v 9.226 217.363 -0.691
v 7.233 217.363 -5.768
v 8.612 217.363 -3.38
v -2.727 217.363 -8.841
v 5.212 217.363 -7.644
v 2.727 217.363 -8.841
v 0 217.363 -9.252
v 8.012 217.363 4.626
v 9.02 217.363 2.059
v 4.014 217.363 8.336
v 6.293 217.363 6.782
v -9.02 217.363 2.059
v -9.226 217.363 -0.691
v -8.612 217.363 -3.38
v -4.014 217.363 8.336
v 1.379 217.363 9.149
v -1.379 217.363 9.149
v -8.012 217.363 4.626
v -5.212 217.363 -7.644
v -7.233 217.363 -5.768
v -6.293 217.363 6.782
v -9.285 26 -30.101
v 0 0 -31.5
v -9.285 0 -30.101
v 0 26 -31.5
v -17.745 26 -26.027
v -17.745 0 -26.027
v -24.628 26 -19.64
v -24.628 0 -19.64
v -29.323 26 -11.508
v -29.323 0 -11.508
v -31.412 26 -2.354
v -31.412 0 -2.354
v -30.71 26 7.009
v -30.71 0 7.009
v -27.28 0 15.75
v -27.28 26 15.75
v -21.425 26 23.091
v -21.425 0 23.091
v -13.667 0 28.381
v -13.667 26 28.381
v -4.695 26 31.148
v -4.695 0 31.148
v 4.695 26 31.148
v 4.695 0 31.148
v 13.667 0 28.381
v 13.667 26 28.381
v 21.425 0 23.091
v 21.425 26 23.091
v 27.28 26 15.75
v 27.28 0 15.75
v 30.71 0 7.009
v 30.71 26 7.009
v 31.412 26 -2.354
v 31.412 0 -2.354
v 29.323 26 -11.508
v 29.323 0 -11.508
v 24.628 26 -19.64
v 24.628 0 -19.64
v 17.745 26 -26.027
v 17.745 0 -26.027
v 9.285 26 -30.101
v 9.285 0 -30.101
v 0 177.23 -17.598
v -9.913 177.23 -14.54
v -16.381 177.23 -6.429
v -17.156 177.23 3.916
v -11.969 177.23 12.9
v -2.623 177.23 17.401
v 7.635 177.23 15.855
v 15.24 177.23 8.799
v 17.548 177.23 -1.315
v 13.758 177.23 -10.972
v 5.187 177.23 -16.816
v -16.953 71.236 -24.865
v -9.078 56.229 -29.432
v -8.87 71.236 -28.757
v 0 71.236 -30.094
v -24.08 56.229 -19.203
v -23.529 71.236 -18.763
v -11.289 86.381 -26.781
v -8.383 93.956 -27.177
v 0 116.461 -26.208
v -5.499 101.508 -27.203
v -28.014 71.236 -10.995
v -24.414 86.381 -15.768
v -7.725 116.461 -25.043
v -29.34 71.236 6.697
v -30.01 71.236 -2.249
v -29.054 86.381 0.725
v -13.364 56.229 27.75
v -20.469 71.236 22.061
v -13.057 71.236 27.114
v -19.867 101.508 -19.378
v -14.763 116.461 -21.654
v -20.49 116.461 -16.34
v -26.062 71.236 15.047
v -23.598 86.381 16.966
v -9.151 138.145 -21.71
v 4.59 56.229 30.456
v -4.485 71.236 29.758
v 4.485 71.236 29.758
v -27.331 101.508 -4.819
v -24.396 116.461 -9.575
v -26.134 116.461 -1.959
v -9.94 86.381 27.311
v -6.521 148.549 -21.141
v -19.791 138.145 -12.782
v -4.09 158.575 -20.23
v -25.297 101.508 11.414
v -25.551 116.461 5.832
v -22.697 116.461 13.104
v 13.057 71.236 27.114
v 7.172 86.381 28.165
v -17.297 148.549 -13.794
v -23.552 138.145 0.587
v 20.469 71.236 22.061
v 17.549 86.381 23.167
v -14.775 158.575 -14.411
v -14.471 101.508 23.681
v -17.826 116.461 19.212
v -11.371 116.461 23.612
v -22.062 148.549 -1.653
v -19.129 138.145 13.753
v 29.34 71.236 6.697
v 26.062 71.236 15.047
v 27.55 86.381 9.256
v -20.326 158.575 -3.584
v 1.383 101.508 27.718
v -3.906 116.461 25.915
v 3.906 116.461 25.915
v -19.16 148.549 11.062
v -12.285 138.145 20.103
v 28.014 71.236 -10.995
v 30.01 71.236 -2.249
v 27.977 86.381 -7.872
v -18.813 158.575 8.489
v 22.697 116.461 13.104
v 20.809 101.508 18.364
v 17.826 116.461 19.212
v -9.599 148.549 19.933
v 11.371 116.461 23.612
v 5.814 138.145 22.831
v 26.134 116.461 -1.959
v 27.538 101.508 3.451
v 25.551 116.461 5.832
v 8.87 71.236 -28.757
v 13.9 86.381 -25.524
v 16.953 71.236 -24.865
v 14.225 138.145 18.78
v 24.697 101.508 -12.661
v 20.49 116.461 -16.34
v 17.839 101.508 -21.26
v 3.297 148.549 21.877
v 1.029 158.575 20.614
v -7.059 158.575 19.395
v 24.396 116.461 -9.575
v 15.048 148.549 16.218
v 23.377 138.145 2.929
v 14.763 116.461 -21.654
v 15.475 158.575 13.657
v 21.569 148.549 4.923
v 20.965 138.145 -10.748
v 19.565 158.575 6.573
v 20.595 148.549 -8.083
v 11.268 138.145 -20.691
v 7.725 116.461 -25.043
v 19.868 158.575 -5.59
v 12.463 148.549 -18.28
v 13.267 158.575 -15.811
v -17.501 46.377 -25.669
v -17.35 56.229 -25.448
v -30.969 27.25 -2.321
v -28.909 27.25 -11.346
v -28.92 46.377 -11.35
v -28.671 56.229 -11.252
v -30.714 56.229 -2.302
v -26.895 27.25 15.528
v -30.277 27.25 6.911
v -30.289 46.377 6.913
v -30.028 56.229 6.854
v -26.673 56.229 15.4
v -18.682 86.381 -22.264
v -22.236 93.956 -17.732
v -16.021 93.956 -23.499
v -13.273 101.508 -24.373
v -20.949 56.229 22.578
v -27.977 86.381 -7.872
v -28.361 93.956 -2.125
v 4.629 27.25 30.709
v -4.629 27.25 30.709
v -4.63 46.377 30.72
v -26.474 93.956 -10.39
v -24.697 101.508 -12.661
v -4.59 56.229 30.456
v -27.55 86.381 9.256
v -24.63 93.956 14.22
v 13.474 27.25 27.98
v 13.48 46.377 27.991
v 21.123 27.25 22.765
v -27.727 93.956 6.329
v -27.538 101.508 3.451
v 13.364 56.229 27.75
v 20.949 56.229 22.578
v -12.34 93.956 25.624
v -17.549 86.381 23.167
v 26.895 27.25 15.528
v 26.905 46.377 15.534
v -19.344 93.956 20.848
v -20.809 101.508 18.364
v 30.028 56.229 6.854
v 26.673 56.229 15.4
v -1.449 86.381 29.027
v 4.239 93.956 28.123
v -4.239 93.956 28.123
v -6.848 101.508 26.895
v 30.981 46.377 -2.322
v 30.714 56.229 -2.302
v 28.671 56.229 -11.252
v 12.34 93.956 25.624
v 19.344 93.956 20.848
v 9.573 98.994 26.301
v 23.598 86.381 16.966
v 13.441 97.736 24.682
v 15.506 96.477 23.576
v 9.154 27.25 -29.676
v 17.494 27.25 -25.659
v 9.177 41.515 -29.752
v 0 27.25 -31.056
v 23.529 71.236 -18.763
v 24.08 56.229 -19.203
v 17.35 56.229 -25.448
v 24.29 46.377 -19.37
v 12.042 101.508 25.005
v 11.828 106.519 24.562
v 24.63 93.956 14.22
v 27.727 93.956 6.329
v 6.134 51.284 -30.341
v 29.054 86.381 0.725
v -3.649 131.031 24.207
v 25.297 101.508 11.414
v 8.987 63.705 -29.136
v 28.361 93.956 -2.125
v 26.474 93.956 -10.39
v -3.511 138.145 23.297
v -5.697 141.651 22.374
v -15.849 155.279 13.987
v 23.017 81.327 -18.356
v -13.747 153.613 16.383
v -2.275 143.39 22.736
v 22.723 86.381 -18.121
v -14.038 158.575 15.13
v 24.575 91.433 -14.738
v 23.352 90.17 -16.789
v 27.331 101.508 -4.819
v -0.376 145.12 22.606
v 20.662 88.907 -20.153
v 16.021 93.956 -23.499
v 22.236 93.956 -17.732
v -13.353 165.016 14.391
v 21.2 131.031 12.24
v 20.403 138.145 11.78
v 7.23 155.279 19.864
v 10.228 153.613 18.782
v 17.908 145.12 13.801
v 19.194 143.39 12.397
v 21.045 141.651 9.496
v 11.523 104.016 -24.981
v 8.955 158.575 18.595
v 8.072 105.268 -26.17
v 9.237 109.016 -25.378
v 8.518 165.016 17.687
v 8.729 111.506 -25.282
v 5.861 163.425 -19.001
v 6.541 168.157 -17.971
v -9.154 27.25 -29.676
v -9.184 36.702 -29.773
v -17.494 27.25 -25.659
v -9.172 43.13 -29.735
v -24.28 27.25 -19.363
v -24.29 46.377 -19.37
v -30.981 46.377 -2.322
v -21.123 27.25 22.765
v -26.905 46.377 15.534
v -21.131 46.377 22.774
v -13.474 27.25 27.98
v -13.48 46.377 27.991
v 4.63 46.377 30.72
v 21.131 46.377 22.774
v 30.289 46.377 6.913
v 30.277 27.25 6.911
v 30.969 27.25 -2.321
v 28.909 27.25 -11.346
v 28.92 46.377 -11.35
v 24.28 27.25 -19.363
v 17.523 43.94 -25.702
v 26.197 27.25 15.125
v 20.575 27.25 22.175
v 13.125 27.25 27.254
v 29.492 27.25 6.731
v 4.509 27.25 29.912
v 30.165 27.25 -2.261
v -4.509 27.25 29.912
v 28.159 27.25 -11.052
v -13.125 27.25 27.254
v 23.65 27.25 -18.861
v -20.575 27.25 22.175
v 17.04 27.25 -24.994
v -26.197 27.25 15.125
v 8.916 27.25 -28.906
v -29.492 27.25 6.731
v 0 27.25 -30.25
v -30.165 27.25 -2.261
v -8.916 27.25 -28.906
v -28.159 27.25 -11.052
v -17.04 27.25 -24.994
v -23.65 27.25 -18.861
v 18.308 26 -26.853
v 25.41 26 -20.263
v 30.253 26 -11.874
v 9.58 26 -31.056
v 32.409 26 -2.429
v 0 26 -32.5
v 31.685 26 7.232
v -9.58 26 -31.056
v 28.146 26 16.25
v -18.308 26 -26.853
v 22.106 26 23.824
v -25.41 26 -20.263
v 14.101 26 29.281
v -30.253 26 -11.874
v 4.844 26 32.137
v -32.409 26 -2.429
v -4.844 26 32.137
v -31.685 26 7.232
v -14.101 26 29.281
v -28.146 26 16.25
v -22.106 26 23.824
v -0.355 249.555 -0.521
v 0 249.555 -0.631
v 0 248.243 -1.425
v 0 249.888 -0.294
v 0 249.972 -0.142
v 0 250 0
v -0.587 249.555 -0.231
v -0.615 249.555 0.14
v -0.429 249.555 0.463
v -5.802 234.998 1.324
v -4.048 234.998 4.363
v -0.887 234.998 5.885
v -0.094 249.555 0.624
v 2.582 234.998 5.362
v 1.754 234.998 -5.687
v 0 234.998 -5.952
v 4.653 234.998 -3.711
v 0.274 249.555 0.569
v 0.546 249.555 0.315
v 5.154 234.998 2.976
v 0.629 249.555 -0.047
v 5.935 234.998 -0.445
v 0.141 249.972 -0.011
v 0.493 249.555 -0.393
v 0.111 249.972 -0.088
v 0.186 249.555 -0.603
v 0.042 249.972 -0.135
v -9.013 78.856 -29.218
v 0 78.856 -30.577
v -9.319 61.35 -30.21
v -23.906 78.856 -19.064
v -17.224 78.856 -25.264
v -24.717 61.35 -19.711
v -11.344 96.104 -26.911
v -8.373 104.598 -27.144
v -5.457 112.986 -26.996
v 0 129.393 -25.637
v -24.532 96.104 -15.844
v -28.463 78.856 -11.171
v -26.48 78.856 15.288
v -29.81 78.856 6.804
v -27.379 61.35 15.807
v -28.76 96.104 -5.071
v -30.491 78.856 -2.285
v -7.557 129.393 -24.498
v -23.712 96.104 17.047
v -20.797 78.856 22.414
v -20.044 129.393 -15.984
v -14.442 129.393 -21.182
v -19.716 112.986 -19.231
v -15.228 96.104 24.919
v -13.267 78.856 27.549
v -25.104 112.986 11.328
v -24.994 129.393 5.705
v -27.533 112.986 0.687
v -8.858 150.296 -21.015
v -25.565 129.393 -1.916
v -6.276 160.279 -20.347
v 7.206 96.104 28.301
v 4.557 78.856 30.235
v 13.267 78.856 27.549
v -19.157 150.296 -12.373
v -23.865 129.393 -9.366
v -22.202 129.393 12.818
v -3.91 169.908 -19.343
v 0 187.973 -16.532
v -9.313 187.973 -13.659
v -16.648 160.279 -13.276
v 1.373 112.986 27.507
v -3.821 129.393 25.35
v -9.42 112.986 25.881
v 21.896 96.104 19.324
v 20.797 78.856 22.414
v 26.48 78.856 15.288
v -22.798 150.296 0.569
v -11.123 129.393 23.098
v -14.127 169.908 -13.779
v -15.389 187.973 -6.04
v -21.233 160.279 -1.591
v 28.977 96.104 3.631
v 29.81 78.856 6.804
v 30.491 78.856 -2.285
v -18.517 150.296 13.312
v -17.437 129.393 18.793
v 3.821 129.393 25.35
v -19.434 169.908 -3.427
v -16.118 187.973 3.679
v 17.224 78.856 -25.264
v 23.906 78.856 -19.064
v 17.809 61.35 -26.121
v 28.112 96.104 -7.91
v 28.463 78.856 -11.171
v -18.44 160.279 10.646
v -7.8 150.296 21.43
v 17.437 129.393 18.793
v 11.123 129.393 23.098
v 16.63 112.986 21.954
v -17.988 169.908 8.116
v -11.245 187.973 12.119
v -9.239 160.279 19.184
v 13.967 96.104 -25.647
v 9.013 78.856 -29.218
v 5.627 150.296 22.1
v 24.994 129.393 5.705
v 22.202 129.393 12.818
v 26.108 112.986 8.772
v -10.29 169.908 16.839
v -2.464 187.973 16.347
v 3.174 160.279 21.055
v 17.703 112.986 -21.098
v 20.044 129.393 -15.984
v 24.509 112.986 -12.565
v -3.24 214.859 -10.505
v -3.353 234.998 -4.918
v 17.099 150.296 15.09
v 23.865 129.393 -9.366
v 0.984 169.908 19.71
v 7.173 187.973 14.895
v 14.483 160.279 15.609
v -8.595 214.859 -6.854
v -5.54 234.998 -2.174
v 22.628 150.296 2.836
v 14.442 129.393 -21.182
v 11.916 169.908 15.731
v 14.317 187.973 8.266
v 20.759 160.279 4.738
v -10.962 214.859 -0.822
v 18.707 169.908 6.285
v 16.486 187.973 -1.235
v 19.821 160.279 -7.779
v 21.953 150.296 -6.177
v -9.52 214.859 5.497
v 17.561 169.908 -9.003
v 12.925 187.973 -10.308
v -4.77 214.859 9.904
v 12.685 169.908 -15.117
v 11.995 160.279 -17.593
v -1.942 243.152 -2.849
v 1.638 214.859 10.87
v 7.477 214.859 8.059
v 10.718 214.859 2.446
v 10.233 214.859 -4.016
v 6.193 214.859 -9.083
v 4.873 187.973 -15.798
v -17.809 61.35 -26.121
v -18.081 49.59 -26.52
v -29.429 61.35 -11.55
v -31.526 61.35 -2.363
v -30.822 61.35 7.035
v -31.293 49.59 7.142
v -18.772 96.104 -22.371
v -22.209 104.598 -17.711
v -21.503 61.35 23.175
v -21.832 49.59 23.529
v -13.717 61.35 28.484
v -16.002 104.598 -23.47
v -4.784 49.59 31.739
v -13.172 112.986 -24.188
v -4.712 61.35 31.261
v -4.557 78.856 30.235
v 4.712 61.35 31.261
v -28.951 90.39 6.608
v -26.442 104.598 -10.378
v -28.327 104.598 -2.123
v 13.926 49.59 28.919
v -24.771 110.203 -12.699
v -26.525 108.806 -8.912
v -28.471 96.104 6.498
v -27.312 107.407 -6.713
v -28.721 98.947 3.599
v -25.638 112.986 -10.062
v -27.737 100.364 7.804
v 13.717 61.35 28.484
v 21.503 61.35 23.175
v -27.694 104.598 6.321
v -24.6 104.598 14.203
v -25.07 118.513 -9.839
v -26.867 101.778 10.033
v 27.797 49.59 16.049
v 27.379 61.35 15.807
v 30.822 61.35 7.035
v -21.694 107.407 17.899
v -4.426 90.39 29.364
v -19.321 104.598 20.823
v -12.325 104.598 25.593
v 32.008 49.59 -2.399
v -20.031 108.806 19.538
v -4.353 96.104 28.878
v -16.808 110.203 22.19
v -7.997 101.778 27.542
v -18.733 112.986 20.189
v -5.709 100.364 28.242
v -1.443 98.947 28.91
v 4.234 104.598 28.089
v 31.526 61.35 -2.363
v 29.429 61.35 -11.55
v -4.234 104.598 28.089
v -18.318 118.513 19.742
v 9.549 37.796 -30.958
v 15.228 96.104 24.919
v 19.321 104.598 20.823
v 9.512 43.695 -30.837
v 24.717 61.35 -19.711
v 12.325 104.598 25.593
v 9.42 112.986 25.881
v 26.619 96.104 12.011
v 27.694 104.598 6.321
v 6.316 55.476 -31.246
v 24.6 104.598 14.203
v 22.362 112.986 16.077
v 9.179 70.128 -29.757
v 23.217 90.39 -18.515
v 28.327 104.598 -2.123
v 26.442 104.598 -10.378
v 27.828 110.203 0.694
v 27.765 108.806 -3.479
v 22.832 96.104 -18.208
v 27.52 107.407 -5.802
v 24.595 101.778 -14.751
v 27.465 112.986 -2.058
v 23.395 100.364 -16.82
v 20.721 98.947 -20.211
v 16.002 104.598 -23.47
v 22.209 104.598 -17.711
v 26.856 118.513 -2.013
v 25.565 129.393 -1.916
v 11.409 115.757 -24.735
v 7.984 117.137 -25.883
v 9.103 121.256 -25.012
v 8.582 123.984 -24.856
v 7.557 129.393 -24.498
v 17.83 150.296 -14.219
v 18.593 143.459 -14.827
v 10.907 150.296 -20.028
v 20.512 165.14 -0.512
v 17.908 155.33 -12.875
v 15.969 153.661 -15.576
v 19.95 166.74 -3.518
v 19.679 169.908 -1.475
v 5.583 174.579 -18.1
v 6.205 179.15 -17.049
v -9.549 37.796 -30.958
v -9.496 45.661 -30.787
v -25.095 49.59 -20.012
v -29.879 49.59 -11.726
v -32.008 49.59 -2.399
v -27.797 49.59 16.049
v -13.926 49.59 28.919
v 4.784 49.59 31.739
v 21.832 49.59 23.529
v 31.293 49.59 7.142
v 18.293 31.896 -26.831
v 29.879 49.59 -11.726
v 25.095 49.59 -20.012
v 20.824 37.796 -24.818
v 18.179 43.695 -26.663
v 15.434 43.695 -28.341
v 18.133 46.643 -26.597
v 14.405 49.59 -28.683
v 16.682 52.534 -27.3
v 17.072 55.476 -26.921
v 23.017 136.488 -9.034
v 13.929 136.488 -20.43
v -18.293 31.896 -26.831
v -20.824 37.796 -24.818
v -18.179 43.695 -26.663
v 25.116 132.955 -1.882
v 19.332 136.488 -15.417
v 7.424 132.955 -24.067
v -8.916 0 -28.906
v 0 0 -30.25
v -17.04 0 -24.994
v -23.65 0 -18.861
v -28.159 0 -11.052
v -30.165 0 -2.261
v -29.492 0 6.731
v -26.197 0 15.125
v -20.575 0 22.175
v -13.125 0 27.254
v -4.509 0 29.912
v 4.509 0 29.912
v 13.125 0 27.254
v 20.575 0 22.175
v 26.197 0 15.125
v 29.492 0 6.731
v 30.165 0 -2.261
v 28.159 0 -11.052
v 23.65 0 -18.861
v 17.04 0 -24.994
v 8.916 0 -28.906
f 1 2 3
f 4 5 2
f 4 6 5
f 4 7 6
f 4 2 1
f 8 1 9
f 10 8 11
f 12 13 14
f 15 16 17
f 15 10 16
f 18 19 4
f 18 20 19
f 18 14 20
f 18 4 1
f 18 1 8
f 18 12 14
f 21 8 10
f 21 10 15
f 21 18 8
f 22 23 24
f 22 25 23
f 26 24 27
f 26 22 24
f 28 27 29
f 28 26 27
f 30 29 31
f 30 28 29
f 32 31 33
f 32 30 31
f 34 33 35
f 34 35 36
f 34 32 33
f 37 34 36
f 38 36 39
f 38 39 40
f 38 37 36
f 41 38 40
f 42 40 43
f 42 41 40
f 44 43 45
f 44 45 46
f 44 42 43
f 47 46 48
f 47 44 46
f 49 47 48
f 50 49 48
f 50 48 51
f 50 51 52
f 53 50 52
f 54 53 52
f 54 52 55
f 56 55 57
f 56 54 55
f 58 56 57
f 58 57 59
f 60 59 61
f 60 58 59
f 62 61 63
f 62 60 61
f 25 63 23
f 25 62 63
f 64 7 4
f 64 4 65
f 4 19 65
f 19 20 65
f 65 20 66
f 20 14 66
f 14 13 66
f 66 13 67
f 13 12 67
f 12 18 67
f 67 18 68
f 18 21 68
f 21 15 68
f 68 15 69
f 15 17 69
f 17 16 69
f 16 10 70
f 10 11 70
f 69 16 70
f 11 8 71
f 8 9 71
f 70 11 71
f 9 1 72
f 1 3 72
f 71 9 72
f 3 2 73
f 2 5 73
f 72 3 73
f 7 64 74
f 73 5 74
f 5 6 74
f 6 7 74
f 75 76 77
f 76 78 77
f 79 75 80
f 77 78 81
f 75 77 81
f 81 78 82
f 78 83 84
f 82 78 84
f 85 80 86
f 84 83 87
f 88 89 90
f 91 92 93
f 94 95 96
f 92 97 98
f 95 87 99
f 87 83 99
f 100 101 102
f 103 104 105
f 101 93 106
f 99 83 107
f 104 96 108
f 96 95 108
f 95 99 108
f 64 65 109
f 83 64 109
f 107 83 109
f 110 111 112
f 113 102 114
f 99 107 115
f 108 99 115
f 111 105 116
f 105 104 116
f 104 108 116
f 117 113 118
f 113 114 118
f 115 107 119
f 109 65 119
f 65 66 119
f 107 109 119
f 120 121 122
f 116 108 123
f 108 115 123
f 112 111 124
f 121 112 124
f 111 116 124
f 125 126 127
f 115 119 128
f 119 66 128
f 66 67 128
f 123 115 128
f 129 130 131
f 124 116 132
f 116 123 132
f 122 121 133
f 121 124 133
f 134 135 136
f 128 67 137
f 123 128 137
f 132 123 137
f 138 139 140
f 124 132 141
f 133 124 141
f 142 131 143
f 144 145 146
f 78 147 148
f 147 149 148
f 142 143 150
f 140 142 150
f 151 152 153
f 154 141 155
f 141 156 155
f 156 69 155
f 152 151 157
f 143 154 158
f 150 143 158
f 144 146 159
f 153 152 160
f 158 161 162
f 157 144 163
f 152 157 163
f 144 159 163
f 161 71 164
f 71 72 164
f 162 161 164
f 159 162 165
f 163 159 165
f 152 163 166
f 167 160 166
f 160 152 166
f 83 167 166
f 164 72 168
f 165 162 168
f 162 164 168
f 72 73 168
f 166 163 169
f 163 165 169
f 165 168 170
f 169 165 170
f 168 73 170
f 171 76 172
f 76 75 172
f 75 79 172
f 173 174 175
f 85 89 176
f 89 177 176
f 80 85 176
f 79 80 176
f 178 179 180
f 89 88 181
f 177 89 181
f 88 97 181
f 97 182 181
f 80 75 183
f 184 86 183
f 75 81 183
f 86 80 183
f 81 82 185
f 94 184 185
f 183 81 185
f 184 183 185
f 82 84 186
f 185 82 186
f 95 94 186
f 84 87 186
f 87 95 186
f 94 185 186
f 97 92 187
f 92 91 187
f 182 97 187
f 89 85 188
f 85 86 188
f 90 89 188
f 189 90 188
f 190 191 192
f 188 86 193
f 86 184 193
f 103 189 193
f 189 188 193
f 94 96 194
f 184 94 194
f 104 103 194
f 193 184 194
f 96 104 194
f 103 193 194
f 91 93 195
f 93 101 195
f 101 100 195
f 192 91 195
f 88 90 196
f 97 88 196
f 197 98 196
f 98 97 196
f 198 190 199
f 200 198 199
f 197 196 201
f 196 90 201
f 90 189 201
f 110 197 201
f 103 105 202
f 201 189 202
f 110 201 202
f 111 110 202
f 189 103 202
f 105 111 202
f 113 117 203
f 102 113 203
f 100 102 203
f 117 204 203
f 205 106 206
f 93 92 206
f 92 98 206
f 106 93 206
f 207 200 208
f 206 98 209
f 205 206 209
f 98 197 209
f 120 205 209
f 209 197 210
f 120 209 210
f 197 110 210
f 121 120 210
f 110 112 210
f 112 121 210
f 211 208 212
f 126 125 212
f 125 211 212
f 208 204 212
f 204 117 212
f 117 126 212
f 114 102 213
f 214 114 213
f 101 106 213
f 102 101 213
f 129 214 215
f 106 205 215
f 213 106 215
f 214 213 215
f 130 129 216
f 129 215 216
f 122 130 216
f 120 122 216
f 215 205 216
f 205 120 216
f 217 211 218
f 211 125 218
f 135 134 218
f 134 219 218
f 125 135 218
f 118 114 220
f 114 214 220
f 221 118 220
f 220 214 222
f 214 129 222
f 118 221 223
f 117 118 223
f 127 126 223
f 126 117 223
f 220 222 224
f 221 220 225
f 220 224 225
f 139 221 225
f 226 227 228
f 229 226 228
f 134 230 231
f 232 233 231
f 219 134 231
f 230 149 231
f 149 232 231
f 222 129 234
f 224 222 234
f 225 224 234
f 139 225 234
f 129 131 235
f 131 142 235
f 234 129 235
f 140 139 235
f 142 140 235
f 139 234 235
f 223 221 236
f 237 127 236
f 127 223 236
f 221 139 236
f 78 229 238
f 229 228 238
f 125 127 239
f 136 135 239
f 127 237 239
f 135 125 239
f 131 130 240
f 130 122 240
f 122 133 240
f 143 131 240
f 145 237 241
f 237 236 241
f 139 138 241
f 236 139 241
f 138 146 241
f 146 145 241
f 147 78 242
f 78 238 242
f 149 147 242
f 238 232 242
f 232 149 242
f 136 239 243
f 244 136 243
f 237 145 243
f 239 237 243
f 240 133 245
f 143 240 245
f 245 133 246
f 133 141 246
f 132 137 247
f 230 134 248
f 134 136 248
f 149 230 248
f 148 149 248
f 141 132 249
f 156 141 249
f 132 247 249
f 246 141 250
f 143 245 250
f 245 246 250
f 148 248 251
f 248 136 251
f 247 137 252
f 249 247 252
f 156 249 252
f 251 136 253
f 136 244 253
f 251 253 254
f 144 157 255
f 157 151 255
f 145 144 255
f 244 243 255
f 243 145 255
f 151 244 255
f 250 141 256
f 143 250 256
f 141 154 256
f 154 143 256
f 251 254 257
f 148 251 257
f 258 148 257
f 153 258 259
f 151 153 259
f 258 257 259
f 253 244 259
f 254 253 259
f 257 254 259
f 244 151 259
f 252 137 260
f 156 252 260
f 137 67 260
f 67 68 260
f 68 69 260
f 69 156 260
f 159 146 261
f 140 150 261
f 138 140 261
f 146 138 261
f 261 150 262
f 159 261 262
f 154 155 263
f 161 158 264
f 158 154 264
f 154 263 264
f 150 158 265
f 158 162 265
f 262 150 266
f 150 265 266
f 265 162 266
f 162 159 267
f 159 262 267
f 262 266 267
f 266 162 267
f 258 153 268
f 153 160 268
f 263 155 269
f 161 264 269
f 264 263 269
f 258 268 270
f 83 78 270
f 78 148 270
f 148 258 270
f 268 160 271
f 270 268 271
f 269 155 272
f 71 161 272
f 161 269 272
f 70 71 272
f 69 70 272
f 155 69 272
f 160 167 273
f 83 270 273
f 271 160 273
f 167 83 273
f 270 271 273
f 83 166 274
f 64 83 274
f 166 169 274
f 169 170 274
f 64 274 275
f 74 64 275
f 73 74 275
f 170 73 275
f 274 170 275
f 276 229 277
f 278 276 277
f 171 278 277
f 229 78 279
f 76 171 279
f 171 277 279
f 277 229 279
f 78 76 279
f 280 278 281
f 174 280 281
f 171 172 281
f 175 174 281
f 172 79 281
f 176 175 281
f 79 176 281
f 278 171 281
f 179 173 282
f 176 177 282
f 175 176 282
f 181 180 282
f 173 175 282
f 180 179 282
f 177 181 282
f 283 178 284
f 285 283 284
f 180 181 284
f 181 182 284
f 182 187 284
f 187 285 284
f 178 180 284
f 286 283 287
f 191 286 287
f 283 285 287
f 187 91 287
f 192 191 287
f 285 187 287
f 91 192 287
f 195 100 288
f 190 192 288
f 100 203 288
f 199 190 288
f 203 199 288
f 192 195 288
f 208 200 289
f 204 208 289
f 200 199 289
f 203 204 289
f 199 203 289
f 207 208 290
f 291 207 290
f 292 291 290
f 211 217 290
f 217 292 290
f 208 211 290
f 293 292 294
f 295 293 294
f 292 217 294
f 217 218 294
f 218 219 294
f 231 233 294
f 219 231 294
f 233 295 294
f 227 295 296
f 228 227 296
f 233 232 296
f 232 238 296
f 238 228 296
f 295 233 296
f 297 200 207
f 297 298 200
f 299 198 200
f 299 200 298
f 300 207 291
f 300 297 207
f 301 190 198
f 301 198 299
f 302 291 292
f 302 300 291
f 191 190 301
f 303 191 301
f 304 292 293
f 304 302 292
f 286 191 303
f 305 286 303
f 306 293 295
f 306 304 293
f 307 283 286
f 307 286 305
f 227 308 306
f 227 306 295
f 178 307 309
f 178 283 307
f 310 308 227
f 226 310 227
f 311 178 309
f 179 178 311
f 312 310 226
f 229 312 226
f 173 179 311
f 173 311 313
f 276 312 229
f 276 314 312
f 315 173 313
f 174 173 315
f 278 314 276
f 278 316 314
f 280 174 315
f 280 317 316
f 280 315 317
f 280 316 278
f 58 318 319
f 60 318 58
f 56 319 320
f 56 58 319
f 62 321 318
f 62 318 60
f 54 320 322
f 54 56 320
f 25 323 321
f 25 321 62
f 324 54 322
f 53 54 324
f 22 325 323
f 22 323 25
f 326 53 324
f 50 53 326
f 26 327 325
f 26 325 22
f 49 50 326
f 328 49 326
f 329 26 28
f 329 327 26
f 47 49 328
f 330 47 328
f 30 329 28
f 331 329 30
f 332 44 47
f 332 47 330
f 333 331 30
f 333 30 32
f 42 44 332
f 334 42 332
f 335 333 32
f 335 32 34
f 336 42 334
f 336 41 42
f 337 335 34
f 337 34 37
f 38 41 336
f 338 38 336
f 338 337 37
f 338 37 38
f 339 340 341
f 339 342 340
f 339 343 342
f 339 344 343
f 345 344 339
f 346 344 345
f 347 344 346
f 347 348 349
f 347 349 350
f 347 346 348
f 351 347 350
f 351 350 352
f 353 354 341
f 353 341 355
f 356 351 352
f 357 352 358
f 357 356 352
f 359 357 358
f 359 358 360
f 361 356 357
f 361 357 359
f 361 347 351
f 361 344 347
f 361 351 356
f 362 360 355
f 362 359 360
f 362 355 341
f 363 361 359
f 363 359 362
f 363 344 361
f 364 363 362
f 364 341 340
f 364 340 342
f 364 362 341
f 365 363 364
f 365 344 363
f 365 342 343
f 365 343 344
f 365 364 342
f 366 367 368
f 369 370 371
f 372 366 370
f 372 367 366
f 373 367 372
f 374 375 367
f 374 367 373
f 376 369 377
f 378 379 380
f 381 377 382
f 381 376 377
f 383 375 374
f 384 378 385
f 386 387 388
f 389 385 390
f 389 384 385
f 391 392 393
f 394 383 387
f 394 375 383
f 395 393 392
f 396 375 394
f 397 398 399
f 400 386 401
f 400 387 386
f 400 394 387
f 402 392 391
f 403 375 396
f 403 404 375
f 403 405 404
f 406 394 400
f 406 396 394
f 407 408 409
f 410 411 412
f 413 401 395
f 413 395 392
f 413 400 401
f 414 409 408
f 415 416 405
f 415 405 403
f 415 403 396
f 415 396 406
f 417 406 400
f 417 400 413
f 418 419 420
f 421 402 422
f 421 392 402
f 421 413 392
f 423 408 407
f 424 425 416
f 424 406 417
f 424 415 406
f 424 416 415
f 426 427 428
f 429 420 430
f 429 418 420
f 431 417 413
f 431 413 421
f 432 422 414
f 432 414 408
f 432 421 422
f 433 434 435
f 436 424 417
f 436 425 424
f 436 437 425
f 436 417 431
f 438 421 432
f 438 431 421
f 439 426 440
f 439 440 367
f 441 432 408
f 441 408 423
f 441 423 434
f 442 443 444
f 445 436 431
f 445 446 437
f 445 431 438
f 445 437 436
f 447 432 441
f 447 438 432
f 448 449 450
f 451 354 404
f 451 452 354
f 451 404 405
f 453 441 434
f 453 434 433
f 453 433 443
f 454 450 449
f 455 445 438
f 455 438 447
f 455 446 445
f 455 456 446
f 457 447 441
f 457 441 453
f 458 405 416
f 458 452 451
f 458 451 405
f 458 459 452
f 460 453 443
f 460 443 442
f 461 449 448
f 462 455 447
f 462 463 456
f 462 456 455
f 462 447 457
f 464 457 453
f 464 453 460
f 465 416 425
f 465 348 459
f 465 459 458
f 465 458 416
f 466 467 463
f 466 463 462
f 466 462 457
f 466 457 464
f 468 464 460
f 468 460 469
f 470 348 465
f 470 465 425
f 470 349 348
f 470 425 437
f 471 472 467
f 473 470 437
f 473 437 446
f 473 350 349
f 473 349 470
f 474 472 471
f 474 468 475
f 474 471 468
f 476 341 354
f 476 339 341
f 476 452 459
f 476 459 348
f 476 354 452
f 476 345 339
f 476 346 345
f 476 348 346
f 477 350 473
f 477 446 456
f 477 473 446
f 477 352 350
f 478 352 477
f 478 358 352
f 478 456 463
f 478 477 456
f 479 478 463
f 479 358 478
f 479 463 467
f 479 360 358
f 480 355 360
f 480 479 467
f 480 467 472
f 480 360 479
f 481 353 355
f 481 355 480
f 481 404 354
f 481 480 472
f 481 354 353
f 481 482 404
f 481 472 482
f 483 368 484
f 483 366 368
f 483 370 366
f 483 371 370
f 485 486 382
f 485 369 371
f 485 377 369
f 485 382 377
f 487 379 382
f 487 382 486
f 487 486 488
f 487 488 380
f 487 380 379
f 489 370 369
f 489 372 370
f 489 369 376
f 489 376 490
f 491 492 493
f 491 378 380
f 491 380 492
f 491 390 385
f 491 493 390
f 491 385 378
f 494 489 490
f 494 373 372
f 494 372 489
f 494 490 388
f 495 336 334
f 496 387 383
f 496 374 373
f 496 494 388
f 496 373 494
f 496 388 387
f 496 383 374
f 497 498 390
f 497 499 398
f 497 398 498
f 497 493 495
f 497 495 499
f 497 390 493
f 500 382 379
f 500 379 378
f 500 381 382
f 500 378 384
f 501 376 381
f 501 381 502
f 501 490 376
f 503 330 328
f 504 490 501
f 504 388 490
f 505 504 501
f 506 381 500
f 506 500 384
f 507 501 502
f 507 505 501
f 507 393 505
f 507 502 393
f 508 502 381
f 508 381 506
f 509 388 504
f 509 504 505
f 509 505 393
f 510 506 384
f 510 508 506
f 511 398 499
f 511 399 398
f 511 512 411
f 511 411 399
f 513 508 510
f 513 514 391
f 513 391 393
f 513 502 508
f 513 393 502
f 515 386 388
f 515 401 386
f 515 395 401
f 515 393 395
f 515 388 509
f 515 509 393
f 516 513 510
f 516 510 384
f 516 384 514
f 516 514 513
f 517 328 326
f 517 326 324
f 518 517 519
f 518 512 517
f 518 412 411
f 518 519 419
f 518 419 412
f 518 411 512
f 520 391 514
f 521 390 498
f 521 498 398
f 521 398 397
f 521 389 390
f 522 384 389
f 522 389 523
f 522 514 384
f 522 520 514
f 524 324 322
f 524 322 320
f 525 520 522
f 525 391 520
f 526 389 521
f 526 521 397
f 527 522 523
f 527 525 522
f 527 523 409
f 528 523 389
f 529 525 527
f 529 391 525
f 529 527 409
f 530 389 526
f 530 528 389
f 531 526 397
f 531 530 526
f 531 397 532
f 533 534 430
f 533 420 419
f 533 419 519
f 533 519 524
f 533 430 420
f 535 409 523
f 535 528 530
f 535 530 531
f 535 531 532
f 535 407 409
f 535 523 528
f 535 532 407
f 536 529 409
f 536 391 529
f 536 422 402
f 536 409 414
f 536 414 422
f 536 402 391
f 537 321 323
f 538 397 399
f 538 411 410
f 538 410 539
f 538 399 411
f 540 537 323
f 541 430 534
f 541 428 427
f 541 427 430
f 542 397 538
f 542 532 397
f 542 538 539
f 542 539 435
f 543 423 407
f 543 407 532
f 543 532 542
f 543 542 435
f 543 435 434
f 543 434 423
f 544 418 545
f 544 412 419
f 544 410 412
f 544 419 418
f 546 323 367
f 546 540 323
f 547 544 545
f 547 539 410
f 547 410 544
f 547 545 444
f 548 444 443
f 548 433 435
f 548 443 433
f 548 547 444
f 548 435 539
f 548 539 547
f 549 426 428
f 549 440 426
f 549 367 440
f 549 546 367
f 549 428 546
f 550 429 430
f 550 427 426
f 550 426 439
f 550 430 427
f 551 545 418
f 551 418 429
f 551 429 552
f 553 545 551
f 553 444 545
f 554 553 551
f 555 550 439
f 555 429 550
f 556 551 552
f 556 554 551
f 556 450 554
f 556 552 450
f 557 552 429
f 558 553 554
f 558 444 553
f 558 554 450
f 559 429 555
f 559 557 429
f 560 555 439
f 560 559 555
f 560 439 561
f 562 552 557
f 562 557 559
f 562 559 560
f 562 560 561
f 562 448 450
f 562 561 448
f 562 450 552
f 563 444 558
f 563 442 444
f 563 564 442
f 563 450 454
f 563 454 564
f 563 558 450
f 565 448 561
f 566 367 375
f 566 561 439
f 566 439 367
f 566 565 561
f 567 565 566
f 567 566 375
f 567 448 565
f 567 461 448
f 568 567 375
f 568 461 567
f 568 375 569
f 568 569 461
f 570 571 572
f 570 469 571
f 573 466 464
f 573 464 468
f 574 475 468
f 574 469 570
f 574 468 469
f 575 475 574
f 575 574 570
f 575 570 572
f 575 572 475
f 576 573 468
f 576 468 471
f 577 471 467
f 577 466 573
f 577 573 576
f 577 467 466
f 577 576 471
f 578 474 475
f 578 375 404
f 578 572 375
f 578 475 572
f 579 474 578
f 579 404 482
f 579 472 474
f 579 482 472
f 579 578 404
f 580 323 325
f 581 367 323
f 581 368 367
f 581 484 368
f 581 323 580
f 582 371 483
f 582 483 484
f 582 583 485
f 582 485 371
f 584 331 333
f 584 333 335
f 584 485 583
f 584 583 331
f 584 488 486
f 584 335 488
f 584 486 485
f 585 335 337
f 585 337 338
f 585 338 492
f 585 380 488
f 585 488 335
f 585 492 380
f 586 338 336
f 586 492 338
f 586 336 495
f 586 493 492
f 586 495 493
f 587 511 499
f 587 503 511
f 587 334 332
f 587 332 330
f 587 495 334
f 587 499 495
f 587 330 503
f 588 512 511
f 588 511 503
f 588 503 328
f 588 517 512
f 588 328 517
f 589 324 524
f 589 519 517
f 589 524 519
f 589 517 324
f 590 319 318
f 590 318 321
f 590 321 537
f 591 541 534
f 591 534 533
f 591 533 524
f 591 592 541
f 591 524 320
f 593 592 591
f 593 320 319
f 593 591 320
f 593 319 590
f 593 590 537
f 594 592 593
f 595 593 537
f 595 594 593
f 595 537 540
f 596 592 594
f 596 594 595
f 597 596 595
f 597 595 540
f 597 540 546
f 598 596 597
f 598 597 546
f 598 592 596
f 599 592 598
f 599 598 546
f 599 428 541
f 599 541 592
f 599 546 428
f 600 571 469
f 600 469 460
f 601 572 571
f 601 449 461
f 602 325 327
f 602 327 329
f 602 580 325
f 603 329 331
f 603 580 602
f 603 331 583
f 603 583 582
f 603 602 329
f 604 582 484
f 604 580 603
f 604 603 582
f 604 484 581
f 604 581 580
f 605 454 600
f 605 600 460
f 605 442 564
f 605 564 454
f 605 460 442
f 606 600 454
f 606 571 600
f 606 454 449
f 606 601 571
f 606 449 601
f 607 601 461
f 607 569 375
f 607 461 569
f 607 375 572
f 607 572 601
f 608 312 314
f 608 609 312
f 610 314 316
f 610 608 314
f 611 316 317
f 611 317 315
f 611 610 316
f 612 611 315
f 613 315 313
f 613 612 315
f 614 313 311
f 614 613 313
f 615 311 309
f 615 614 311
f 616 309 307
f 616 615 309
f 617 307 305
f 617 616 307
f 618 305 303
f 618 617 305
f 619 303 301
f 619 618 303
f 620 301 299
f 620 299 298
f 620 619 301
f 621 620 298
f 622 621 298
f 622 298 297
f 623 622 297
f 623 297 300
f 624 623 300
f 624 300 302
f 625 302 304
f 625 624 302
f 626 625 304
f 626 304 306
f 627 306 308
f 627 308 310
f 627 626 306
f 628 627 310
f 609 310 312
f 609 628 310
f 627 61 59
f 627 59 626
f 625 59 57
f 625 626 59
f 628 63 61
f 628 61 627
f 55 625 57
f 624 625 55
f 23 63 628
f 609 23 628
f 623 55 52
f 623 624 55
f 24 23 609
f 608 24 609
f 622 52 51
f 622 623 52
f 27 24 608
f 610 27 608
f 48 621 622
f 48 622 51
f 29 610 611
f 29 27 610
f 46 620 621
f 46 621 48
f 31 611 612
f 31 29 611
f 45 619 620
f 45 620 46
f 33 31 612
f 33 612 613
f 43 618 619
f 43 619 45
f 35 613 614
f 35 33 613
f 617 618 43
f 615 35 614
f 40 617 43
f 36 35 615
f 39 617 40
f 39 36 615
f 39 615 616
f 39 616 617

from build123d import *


with BuildPart() as part:
    # Esboço1 → Revolução1 (revolve)
    with BuildSketch(Plane.XY, mode=Mode.PRIVATE) as revolu_o1_sk:
        with BuildLine():
            Line((31.5, 0), (31.5, 26))
            Line((31.5, 26), (32.5, 26))
            add(Edge.make_bspline(
                [(32.5, 26), (32.5, 136), (5, 250), (0, 250)],
                knots=[0, 0, 0, 0, 1, 1, 1, 1], degree=3))
            Line((0, 250), (0, 217.362983304))
            Line((0, 217.362983304), (9.251837337, 217.362983304))
            add(Edge.make_bspline(
                [(31.055550101, 27.25), (32.565147741, 97.034066377), (16.88169364, 189.386843526), (9.251837337, 217.362983304)],
                knots=[0, 0, 0, 0, 1, 1, 1, 1], degree=3))
            Line((31.055550101, 27.25), (30.25, 27.25))
            Line((30.25, 27.25), (30.25, 1.25))
            Line((30.25, 1.25), (30.25, 0))
            Line((30.25, 0), (31.5, 0))
        make_face()
    revolve(revolu_o1_sk.sketch.rotate(Axis((0, 0, 0), (0, 1, 0)), 90), axis=Axis((0, 0, 0), (0, 1, 0)))


solid = part.part
